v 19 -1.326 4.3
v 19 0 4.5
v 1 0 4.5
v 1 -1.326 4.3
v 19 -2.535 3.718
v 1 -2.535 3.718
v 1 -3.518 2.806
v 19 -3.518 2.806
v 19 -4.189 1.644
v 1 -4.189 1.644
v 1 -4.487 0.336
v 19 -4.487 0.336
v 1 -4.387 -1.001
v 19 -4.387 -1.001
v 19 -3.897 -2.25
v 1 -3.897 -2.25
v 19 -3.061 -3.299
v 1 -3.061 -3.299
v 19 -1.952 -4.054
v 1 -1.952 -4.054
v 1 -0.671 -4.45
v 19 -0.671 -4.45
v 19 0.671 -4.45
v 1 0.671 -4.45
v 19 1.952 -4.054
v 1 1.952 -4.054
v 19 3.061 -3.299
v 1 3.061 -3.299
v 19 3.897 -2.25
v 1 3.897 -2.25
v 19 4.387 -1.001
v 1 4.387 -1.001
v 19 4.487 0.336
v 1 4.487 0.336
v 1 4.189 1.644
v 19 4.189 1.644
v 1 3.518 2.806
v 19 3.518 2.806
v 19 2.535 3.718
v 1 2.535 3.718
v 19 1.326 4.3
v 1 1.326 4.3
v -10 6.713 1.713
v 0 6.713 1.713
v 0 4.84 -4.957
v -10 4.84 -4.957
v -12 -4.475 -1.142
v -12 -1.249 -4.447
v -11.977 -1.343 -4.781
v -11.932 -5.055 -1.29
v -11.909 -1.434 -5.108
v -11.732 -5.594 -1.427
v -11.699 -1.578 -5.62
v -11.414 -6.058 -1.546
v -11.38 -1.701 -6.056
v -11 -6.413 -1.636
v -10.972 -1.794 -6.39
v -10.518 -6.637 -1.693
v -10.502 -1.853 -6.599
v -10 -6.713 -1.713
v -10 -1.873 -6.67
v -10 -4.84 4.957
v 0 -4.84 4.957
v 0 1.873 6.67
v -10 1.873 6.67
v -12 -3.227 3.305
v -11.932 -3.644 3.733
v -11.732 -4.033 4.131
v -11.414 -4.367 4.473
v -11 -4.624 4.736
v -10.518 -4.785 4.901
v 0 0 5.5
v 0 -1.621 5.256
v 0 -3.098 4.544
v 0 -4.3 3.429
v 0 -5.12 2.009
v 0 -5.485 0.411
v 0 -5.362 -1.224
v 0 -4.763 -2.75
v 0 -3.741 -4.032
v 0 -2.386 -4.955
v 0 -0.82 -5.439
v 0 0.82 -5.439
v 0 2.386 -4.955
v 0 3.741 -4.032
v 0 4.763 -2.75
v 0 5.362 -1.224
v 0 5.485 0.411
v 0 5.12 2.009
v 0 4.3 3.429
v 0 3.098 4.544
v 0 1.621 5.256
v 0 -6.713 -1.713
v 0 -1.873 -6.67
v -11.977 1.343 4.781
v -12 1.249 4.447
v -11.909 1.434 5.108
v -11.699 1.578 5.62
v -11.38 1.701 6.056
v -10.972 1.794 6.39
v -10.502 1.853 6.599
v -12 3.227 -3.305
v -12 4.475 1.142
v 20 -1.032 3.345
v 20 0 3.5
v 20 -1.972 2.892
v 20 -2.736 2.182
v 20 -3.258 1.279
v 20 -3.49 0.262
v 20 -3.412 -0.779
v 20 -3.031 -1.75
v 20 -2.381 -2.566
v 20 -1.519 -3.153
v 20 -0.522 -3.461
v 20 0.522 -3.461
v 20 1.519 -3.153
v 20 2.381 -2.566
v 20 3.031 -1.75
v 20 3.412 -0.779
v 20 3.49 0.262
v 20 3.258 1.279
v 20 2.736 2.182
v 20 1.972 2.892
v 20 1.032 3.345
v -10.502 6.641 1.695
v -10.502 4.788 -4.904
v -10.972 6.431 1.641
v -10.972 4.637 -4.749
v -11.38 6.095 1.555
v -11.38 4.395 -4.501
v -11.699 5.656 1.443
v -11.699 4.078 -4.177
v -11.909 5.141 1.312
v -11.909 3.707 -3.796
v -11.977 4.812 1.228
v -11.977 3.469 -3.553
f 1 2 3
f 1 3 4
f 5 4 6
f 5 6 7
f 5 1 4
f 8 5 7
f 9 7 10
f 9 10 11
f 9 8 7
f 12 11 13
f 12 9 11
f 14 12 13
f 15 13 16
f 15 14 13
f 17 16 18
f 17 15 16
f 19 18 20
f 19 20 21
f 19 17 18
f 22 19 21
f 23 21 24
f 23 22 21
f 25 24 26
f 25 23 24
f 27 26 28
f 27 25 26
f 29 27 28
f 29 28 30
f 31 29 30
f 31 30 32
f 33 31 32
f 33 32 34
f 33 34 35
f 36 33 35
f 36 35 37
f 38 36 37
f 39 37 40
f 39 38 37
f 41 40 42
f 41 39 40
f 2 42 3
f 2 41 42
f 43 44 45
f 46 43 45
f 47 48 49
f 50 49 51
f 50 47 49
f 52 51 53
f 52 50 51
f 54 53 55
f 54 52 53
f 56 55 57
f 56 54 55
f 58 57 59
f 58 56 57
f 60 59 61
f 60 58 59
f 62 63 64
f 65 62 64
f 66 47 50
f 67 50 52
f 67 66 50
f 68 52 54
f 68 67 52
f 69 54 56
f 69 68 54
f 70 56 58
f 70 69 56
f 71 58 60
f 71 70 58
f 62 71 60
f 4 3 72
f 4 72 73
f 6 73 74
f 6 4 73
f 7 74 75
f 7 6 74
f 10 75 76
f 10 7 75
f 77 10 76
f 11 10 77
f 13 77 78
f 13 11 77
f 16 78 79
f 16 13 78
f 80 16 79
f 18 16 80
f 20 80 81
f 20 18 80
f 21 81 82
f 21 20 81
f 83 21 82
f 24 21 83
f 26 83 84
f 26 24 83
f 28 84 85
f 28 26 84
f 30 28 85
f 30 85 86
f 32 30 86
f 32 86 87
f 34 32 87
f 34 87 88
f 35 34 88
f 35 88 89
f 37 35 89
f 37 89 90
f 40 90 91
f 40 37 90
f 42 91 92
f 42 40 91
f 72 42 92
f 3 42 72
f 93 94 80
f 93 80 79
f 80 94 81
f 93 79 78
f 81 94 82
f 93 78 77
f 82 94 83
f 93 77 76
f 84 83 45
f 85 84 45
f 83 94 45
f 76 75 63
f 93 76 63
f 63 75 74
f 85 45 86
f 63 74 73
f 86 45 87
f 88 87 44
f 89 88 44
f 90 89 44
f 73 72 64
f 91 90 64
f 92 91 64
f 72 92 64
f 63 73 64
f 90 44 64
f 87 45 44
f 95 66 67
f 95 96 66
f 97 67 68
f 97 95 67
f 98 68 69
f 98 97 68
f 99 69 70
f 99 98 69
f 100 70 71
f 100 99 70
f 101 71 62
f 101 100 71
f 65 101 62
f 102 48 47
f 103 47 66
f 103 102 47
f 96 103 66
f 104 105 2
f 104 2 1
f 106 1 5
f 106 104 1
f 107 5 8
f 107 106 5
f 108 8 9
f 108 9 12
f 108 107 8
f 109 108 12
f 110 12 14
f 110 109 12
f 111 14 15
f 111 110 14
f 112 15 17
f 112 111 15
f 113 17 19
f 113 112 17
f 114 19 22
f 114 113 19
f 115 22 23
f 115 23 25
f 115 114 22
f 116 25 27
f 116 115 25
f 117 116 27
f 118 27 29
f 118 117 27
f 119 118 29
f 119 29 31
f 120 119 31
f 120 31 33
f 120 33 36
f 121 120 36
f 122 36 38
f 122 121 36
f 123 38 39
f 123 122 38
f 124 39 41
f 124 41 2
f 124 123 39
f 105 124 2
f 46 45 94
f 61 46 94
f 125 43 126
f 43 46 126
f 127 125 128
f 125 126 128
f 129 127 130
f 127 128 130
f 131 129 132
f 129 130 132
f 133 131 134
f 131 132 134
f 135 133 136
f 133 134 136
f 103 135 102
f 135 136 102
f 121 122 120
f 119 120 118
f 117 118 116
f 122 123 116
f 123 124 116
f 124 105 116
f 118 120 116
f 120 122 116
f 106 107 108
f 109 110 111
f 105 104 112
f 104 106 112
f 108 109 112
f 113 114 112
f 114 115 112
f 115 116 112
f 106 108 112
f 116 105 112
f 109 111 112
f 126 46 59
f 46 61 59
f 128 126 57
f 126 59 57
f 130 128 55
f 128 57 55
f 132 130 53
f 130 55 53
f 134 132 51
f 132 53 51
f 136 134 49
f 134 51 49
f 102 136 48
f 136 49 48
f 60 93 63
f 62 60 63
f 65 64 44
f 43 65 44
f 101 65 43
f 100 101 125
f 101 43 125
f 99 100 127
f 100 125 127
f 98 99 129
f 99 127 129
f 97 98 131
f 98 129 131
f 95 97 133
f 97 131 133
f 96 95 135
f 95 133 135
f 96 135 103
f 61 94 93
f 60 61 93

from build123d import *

# Parameters (mm, degrees)
SKETCH_1_W      = 20
SKETCH_1_H      = 4.5
EXTRUDE_1_DEPTH = 12
FILLET_1_R      = 2
CHAMFER_1_SIZE  = 1


with BuildPart() as part:
    # 草圖1 → 旋轉1 (revolve)
    with BuildSketch(Plane.XY, mode=Mode.PRIVATE) as revolve_1_sk:
        with Locations((10, 2.25)):
            Rectangle(SKETCH_1_W, SKETCH_1_H)
    revolve(revolve_1_sk.sketch.rotate(Axis((0, 0, 0), (1, 0, 0)), 90), axis=Axis((0, 0, 0), (1, 0, 0)))

    # 草圖2 → 填料-伸長1 (add)
    with BuildSketch(Plane.ZY):
        Polygon((1.712942348, 6.713108707), (-4.957251505, 4.840005942), (-6.670193853, -1.873102765), (-1.712942348, -6.713108707), (4.957251505, -4.840005942), (6.670193853, 1.873102765), align=None)
    extrude(amount=EXTRUDE_1_DEPTH)

    # 圓角1
    fillet_1_edges = [part.edges().sort_by_distance(p)[0] for p in [
        (-12, 4.293105736, 4.1915681),
        (-12, 5.776557325, -1.622154578),
        (-12, 1.483451589, -5.813722679),
        (-12, -4.293105736, -4.1915681),
        (-12, -5.776557325, 1.622154578),
        (-12, -1.483451589, 5.813722679),
    ]]
    fillet(fillet_1_edges, radius=FILLET_1_R)

    # 導角1
    chamfer_1_edges = [part.edges().sort_by_distance(p)[0] for p in [
        (20, 0, -4.5),
        (0, 0, -4.5),
    ]]
    chamfer(chamfer_1_edges, length=CHAMFER_1_SIZE)


solid = part.part
